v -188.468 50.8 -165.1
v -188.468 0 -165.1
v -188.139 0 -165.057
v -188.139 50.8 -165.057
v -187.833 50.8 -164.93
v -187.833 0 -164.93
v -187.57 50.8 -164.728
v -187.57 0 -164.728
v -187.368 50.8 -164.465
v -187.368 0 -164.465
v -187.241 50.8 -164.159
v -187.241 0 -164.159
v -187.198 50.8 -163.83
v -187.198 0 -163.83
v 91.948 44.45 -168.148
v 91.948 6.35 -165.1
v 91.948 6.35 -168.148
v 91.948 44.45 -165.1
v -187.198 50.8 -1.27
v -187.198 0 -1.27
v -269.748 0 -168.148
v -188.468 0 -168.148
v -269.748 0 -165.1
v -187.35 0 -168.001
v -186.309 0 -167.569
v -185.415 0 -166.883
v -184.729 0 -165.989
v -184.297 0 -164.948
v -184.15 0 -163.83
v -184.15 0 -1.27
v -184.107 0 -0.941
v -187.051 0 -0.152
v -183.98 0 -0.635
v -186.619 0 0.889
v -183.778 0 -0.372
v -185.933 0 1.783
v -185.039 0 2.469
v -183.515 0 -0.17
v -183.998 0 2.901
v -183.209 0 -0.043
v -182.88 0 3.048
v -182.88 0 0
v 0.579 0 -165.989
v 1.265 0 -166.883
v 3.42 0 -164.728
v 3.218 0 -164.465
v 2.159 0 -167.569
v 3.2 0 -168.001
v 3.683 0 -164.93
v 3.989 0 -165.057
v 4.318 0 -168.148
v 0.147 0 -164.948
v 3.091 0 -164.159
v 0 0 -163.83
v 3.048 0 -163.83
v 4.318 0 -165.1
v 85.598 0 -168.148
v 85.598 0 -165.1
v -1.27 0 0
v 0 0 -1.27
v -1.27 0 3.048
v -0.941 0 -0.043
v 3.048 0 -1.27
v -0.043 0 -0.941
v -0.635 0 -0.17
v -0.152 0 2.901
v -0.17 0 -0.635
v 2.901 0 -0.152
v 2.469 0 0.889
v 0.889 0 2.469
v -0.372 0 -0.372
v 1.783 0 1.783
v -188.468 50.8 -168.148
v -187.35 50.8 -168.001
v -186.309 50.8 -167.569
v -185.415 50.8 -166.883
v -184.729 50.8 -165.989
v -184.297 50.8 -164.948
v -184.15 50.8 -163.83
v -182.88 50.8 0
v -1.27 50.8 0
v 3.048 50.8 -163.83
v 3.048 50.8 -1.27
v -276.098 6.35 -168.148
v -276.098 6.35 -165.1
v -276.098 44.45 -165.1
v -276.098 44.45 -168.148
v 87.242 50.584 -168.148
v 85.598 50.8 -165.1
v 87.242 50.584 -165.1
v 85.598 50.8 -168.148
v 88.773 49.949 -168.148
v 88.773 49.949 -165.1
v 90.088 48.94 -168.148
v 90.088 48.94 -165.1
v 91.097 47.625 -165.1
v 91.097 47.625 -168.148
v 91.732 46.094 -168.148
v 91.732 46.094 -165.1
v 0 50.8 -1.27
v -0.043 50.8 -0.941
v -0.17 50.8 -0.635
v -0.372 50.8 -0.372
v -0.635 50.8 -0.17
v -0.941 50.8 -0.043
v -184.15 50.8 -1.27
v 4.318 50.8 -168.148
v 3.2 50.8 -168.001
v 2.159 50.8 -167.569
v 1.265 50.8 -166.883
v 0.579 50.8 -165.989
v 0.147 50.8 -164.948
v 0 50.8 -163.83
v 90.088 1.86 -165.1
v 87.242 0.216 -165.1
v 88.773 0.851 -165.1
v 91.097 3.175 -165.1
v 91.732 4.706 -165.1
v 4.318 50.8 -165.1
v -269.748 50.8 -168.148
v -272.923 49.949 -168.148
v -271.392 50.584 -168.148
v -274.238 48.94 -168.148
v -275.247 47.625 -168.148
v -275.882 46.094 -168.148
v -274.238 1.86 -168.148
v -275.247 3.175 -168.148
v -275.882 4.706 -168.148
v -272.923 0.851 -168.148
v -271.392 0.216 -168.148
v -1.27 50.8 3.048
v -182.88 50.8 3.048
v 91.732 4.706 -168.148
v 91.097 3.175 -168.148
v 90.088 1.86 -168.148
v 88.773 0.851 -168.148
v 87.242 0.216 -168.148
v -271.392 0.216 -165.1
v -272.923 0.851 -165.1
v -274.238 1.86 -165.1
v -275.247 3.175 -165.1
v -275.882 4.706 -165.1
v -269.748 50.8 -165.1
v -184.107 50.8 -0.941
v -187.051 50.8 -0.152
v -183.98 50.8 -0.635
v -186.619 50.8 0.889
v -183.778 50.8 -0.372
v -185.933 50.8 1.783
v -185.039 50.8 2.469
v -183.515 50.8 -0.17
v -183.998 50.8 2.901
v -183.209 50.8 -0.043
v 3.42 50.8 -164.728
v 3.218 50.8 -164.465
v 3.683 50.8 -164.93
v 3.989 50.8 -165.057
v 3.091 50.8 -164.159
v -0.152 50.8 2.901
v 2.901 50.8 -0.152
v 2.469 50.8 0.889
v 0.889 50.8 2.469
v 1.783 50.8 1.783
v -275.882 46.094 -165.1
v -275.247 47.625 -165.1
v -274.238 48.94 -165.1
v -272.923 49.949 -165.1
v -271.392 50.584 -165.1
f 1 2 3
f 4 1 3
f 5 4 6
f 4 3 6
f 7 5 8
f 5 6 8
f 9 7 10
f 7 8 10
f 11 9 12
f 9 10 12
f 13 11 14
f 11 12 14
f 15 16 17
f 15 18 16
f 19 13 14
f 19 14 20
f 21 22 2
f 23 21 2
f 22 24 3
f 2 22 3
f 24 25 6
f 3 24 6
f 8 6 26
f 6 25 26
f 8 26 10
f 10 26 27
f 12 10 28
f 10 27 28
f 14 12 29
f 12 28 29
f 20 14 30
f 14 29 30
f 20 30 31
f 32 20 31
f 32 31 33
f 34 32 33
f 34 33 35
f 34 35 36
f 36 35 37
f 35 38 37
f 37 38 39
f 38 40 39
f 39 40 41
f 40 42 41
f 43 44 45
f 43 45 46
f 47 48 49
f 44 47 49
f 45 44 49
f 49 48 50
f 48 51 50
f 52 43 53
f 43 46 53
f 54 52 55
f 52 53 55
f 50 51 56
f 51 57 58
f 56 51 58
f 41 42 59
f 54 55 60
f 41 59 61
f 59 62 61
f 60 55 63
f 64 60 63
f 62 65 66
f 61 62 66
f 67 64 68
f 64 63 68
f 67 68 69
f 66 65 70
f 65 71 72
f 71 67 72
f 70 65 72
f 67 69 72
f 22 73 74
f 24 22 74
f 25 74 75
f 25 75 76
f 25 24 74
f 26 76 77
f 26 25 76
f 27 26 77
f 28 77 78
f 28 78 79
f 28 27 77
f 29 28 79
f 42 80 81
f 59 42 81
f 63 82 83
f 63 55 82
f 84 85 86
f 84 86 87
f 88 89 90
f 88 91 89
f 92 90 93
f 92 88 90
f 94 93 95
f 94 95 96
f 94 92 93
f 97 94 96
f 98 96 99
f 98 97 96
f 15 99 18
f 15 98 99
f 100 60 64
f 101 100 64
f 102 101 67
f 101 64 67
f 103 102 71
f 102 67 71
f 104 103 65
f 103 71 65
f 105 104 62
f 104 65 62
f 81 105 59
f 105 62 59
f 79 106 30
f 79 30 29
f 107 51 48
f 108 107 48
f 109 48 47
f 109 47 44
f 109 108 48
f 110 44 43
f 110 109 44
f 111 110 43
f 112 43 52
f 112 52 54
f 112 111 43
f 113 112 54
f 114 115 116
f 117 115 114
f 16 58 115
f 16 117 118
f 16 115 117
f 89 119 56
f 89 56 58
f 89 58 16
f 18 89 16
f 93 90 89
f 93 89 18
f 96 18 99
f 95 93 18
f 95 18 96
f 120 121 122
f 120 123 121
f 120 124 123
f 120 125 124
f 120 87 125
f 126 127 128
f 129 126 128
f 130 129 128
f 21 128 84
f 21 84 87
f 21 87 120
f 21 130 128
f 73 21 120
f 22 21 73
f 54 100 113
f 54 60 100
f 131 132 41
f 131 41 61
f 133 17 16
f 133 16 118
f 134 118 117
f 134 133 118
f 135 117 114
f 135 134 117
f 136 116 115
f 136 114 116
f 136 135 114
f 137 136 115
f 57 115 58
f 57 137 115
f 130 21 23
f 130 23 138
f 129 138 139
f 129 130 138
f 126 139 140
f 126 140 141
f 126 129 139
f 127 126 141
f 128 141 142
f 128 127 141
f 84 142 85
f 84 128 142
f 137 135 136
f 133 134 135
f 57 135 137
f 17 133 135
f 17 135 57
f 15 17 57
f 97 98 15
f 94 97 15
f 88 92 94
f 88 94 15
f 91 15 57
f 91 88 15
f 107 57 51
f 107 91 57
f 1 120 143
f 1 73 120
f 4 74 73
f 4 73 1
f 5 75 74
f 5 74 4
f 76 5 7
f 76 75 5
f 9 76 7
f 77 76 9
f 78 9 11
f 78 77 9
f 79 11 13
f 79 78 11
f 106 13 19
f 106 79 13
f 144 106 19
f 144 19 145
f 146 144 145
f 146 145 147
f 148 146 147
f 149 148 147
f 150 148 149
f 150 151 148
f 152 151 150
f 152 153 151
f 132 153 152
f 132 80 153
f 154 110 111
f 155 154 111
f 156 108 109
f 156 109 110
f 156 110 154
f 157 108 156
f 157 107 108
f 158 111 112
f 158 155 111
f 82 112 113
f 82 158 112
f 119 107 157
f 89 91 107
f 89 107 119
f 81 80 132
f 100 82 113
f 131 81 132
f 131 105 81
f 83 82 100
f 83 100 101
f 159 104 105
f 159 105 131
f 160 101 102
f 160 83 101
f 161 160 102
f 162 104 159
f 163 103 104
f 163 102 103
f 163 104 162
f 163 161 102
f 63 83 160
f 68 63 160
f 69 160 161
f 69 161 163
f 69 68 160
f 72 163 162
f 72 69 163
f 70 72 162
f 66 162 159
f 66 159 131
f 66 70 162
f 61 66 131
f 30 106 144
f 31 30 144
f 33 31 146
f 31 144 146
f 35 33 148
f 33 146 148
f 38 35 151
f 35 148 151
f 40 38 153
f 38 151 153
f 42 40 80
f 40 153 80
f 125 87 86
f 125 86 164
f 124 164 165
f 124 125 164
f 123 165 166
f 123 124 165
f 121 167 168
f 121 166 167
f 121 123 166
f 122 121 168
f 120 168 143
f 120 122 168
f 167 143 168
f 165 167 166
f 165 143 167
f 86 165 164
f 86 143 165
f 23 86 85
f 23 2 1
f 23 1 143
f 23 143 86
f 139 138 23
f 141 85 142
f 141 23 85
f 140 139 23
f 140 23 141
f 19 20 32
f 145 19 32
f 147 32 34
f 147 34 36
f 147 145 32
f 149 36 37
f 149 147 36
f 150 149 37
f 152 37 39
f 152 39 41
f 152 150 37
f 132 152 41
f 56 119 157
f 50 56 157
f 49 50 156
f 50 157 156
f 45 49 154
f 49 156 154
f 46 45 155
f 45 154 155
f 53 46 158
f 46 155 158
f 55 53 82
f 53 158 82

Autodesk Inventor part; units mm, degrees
ref_plane "YZ Plane" through (0, 0, 0) normal (1, 0, 0) x (0, 1, 0)
ref_plane "XZ Plane" through (0, 0, 0) normal (0, 1, 0) x (-1, 0, 0)
ref_plane "XY Plane" through (0, 0, 0) normal (0, 0, 1) x (1, 0, 0)
sketch "Sketch1" plane through (0, 0, 0) normal (0, 0, 1) x (1, 0, 0)
  line L0 (0, 0) -> (-184.15, 0)
  line L1 (-184.15, 0) -> (-184.15, 50.8)
  line L2 (-184.15, 50.8) -> (0, 50.8)
  line L3 (0, 50.8) -> (0, 0)
  dimension "d0" = 184.15
  dimension "d1" = 50.8
extrude "Plate1" add sketch "Sketch1" along normal blind 3.048
sketch "Sketch2" plane through (0, 0, 0) normal (1, 0, 0) x (0, 1, 0)
  line L0 (50.8, 0) -> (0, 0)
  line L1 (0, 0) -> (0, -165.1)
  line L2 (0, -165.1) -> (50.8, -165.1)
  line L3 (50.8, -165.1) -> (50.8, 0)
edge flange "Flange1" height 165.1 angle 90 thickness 3.048 bend radius 1.27 thickness toward (1, 0, 0) relief tear relief width 3.048 relief depth 1.524 corner gap 3.048 corner form 0 edges at (0, 25.4, 0) (-184.15, 25.4, 0) wall of the first edge with corners at (0, 50.8, 0) (0, 0, 0) (0, 0, -165.1) (0, 50.8, -165.1)
bend "Bend1"
corner "Corner1"
sketch "Sketch3" plane through (3.048, 50.8, -165.1) normal (0, 0, -1) x (-1, 0, 0)
  line L0 (0, -50.8) -> (0, 0)
  line L1 (0, 0) -> (-88.9, 0)
  line L2 (-88.9, 0) -> (-88.9, -50.8)
  line L3 (-88.9, -50.8) -> (0, -50.8)
edge flange "Flange2" height 88.9 angle 90 thickness 3.048 bend radius 1.27 thickness toward (0, 0, -1) relief tear relief width 3.048 relief depth 1.524 corner gap 3.048 corner form 0 edges at (3.048, 25.4, -165.1) (-187.198, 25.4, -165.1) wall of the first edge with corners at (3.048, 0, -165.1) (3.048, 50.8, -165.1) (91.948, 50.8, -165.1) (91.948, 0, -165.1)
bend "Bend2"
corner "Corner2"
fillet "Corner Round1" radius 6.35 4 edges at (-276.098, 0, -166.624) (-276.098, 50.8, -166.624) (91.948, 0, -166.624) (91.948, 50.8, -166.624)
equation "\"d3\" = BendReliefWidth"
equation "\"d4\" = BendReliefDepth"
equation "\"d5\" = MinimumRemnant"
equation "\"d6\" = BendRadius"
equation "\"d10\" = CornerReliefSize"
equation "\"d11\" = GapSize"
equation "\"d12\" = JacobiRadiusSize"
equation "\"d13\" = BendReliefWidth"
equation "\"d14\" = BendReliefDepth"
equation "\"d15\" = MinimumRemnant"
equation "\"d16\" = BendRadius"
equation "\"d20\" = CornerReliefSize"
equation "\"d21\" = GapSize"
equation "\"d22\" = JacobiRadiusSize"
equation "\"BendRadius\" = Thickness"
equation "\"BendReliefWidth\" = Thickness"
equation "\"BendReliefDepth\" = 0.5 * Thickness"
equation "\"CornerReliefSize\" = 4 * Thickness"
equation "\"MinimumRemnant\" = 2 * Thickness"
equation "\"TransitionRadius\" = BendRadius"
equation "\"JacobiRadiusSize\" = BendRadius"
equation "\"GapSize\" = Thickness"
equation "\"d2\" = BendRadius"
equation "\"Thickness\" = 3.048"
properties part number "battery staple"
